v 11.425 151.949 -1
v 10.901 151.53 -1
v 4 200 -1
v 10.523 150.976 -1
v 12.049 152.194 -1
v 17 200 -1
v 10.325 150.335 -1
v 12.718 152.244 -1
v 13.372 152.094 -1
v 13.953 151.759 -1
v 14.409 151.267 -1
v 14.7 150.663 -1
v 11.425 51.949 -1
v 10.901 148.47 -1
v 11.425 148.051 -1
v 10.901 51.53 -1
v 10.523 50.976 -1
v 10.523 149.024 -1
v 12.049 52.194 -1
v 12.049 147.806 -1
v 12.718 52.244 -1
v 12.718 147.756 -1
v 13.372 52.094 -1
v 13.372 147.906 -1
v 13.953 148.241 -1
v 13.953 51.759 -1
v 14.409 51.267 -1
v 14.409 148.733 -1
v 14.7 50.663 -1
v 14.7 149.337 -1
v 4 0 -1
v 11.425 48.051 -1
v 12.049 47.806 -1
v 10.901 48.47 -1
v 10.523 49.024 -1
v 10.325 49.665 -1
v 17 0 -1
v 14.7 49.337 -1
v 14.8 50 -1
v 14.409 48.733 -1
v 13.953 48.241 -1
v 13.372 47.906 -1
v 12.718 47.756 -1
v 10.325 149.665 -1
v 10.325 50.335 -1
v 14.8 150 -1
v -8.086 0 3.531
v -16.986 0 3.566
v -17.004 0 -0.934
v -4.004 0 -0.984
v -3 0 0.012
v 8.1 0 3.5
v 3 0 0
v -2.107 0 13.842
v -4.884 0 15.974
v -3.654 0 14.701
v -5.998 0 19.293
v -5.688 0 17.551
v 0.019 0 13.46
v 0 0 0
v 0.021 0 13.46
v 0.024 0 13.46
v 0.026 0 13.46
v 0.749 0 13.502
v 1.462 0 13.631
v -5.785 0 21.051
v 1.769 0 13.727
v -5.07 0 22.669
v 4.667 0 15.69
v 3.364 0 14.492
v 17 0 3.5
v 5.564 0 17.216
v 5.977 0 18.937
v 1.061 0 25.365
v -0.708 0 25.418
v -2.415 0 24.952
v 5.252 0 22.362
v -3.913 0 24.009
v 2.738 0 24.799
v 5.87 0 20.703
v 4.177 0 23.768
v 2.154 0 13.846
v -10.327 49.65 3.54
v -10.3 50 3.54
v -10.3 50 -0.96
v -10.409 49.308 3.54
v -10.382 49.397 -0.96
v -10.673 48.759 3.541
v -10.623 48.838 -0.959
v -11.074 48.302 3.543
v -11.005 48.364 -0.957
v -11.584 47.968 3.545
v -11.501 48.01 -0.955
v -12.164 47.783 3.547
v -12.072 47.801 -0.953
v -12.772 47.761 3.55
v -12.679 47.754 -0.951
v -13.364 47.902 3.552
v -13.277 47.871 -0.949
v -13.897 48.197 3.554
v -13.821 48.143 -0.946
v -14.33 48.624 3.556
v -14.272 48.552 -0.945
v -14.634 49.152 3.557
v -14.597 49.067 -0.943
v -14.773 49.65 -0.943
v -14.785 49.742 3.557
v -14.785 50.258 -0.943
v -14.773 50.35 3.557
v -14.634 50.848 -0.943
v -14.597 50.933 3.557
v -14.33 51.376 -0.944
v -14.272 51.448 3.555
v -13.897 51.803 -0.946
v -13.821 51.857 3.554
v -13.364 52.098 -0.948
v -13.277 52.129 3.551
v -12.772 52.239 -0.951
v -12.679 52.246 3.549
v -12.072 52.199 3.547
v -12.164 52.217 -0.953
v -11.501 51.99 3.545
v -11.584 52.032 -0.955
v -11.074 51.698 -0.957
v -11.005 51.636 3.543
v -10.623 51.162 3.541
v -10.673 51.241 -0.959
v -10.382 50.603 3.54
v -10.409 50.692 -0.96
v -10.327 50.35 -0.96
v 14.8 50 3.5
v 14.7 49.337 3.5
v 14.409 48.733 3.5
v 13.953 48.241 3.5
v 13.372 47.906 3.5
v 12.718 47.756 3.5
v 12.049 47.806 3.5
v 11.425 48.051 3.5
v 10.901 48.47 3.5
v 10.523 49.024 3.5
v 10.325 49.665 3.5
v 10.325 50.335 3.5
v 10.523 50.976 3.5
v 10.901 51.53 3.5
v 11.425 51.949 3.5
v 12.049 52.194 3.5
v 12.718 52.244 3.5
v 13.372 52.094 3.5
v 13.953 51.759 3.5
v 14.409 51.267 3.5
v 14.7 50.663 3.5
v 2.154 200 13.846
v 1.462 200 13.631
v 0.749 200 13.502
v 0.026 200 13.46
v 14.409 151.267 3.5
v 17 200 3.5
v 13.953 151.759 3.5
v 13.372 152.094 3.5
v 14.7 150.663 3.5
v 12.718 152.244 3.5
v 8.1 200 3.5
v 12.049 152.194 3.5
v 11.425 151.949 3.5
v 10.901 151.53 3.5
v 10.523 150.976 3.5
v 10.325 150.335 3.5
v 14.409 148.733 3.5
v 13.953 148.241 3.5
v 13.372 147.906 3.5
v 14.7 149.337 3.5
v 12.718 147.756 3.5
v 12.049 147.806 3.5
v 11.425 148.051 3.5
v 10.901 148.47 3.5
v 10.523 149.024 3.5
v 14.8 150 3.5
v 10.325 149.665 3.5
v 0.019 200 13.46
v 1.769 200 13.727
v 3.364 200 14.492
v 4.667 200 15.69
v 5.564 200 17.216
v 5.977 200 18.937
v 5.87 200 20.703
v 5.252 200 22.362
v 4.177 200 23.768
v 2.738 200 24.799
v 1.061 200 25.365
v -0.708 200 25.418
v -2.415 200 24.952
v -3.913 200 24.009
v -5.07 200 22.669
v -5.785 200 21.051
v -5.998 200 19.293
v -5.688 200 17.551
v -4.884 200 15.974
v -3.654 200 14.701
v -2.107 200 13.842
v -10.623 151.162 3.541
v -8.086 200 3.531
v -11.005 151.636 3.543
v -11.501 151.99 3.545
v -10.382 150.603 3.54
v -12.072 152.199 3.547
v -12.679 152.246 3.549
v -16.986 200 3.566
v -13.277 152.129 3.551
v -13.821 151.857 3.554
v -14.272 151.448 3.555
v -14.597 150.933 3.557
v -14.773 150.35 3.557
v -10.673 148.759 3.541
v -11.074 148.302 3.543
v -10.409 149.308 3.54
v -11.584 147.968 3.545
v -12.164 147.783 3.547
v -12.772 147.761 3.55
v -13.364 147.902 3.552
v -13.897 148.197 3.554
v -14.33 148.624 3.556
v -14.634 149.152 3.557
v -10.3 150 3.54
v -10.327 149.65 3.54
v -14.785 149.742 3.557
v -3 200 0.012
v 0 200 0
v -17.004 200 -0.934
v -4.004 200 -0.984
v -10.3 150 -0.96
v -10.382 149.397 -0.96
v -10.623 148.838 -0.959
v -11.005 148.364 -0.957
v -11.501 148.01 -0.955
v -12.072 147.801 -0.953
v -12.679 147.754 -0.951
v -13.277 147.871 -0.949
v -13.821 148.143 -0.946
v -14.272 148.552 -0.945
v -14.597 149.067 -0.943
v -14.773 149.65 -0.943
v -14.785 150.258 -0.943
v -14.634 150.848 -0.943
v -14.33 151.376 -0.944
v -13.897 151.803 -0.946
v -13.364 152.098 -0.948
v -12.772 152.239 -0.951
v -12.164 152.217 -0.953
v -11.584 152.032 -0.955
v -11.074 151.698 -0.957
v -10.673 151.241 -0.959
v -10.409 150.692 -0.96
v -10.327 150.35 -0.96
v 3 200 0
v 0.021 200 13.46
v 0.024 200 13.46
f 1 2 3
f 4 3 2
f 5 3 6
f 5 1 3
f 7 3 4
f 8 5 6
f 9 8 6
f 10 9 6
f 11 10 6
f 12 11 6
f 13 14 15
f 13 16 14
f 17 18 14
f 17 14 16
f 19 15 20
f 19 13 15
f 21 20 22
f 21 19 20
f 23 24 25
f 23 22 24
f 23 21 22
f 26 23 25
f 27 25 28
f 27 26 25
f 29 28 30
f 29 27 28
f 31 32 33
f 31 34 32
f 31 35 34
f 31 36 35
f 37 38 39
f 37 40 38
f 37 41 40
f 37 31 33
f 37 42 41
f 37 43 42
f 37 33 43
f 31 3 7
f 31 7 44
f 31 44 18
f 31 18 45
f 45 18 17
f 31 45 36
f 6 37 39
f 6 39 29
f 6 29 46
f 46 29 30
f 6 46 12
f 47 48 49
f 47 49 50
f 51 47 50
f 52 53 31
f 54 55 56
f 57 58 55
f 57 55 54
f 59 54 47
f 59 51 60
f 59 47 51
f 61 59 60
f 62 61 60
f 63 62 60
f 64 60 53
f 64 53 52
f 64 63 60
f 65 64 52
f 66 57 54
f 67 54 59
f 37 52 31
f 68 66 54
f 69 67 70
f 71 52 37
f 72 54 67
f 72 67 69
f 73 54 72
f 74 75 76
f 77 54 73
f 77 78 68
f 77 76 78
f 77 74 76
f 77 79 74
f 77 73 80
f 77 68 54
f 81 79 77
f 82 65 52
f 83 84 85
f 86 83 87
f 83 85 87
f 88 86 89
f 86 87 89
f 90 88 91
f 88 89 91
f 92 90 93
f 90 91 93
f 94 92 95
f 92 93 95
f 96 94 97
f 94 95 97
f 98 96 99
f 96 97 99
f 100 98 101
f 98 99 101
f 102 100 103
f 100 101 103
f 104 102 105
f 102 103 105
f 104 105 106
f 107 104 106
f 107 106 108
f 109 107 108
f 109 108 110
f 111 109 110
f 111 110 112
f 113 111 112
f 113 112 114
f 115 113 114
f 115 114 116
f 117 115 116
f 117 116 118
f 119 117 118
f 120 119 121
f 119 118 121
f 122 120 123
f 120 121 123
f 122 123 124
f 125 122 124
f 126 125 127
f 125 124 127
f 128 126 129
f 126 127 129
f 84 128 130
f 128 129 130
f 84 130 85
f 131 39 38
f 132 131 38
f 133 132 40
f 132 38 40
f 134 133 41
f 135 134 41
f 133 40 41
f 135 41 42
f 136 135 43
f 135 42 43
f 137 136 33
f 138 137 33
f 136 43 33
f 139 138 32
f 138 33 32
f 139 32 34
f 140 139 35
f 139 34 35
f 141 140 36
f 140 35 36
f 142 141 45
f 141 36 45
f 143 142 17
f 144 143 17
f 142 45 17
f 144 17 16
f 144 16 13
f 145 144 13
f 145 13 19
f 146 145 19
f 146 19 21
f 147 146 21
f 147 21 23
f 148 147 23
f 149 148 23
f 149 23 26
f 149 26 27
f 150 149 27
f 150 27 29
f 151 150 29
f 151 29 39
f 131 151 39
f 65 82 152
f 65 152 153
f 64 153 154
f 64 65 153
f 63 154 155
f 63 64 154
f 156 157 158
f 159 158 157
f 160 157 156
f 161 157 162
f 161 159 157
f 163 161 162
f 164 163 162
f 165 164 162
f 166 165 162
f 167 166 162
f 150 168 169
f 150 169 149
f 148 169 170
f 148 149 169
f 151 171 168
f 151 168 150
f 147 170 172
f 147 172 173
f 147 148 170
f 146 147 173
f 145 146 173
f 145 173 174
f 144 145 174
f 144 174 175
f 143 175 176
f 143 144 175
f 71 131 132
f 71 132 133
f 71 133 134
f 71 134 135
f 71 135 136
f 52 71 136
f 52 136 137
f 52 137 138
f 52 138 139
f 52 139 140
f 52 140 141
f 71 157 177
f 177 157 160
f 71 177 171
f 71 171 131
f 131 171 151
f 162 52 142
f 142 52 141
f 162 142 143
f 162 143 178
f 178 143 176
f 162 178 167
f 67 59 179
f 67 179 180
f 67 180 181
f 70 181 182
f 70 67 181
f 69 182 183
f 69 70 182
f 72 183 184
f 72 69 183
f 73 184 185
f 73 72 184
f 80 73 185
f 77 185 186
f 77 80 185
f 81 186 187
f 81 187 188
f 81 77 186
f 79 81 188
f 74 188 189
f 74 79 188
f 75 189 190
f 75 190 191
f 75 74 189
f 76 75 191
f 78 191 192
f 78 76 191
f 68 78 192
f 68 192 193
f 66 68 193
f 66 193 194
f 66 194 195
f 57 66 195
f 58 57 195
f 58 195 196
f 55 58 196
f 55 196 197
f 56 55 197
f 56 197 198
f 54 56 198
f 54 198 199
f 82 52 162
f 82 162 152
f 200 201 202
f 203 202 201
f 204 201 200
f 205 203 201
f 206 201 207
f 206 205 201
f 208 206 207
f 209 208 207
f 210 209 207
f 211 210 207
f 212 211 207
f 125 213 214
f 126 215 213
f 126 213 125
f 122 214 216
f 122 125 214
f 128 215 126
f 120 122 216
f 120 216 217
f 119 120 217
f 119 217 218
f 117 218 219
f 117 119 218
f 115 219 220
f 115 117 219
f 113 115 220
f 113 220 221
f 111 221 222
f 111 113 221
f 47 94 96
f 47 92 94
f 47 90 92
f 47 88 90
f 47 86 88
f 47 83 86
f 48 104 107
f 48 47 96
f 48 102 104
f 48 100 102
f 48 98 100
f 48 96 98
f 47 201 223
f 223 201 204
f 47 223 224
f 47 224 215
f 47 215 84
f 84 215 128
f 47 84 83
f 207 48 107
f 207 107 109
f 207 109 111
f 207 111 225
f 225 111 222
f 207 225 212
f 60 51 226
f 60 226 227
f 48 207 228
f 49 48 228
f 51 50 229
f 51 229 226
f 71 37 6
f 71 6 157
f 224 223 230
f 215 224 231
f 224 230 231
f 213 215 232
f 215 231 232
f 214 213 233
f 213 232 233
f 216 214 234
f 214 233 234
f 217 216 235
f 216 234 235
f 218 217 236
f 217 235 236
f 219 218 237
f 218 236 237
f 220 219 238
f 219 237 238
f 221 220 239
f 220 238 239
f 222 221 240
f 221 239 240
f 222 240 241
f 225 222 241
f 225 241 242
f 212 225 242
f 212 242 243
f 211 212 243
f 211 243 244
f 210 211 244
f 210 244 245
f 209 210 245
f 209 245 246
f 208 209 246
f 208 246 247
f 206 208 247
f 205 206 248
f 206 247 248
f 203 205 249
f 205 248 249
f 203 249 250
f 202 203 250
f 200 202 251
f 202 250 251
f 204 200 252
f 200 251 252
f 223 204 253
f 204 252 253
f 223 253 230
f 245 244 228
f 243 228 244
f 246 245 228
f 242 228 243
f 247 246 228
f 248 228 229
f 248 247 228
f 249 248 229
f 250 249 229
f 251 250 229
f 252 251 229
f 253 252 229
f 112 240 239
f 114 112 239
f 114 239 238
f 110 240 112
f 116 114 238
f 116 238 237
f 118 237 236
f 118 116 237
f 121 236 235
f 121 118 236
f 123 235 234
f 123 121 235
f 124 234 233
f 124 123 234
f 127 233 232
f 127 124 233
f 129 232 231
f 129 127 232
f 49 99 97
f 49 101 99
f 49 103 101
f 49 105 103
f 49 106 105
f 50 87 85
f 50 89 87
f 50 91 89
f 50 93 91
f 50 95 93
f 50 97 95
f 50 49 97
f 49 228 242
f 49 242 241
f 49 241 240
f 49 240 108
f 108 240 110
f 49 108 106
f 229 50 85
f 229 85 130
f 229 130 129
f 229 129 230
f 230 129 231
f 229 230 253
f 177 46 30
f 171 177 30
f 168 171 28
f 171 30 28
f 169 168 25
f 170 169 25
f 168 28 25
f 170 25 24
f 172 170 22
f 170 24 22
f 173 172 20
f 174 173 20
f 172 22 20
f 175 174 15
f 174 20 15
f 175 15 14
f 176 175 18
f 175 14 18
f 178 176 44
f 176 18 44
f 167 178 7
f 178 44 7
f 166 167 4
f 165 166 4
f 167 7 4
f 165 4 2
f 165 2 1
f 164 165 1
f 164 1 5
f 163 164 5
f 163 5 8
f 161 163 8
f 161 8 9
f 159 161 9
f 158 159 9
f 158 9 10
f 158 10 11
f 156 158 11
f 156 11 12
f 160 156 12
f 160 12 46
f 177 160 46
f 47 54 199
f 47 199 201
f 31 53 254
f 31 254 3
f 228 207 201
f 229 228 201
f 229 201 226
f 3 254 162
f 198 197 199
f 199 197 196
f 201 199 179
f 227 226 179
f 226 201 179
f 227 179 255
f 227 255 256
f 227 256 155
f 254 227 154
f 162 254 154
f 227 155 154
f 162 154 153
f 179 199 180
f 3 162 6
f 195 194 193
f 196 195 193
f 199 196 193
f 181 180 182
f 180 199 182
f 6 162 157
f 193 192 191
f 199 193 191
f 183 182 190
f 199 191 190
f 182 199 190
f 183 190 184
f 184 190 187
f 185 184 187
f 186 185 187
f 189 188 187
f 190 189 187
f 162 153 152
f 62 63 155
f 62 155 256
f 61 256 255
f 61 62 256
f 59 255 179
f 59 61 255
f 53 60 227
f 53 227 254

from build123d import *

# Parameters (mm, degrees)
F1_DEPTH = 200
F2_R     = 6
F3_DEPTH = 200
F4_R     = 2.25
F5_DEPTH = 26.461


with BuildPart() as f1:
    # F0 (on Front) → F1 (new body)
    with BuildSketch(Plane.XZ):
        with BuildLine():
            ThreePointArc((2.153722, 13.845509), (1.107413, 13.556125), (0.026086, 13.460011))
            ThreePointArc((0.026086, 13.460011), (-1.054859, 13.560315), (-2.100039, 13.853753))
            Line((-2.100039, 13.853753), (-8.086373, 3.53137))
            Line((-8.086373, 3.53137), (-16.986306, 3.565868))
            Line((-16.986306, 3.565868), (-17.003748, -0.934098))
            Line((-17.003748, -0.934098), (-4.003846, -0.984488))
            Line((-4.003846, -0.984488), (-2.999977, 0.011628))
            Line((-2.999977, 0.011628), (0, 0))
            Line((0, 0), (3, 0))
            Line((3, 0), (4, -1))
            Line((4, -1), (17, -1))
            Line((17, -1), (17, 3.5))
            Line((17, 3.5), (8.1, 3.5))
            Line((8.1, 3.5), (2.153722, 13.845509))
        make_face()
    extrude(amount=-F1_DEPTH)

    # F2 (on Front) → F3 (join)
    with BuildSketch(Plane.XZ):
        with Locations((0, 19.46)):
            Circle(F2_R)
    extrude(amount=-F3_DEPTH)

    # F4 (on face) → F5 (cut, through all)
    with BuildSketch(Plane(origin=(0, 0, -1), x_dir=(1, 0, 0), z_dir=(0, 0, -1))):
        with Locations((12.55, -50)):
            Circle(F4_R)
        with Locations((12.55, -150)):
            Circle(F4_R)
        with Locations((-12.55, -150)):
            Circle(F4_R)
        with Locations((-12.55, -50)):
            Circle(F4_R)
    extrude(amount=-F5_DEPTH, mode=Mode.SUBTRACT)


solid = f1.part
